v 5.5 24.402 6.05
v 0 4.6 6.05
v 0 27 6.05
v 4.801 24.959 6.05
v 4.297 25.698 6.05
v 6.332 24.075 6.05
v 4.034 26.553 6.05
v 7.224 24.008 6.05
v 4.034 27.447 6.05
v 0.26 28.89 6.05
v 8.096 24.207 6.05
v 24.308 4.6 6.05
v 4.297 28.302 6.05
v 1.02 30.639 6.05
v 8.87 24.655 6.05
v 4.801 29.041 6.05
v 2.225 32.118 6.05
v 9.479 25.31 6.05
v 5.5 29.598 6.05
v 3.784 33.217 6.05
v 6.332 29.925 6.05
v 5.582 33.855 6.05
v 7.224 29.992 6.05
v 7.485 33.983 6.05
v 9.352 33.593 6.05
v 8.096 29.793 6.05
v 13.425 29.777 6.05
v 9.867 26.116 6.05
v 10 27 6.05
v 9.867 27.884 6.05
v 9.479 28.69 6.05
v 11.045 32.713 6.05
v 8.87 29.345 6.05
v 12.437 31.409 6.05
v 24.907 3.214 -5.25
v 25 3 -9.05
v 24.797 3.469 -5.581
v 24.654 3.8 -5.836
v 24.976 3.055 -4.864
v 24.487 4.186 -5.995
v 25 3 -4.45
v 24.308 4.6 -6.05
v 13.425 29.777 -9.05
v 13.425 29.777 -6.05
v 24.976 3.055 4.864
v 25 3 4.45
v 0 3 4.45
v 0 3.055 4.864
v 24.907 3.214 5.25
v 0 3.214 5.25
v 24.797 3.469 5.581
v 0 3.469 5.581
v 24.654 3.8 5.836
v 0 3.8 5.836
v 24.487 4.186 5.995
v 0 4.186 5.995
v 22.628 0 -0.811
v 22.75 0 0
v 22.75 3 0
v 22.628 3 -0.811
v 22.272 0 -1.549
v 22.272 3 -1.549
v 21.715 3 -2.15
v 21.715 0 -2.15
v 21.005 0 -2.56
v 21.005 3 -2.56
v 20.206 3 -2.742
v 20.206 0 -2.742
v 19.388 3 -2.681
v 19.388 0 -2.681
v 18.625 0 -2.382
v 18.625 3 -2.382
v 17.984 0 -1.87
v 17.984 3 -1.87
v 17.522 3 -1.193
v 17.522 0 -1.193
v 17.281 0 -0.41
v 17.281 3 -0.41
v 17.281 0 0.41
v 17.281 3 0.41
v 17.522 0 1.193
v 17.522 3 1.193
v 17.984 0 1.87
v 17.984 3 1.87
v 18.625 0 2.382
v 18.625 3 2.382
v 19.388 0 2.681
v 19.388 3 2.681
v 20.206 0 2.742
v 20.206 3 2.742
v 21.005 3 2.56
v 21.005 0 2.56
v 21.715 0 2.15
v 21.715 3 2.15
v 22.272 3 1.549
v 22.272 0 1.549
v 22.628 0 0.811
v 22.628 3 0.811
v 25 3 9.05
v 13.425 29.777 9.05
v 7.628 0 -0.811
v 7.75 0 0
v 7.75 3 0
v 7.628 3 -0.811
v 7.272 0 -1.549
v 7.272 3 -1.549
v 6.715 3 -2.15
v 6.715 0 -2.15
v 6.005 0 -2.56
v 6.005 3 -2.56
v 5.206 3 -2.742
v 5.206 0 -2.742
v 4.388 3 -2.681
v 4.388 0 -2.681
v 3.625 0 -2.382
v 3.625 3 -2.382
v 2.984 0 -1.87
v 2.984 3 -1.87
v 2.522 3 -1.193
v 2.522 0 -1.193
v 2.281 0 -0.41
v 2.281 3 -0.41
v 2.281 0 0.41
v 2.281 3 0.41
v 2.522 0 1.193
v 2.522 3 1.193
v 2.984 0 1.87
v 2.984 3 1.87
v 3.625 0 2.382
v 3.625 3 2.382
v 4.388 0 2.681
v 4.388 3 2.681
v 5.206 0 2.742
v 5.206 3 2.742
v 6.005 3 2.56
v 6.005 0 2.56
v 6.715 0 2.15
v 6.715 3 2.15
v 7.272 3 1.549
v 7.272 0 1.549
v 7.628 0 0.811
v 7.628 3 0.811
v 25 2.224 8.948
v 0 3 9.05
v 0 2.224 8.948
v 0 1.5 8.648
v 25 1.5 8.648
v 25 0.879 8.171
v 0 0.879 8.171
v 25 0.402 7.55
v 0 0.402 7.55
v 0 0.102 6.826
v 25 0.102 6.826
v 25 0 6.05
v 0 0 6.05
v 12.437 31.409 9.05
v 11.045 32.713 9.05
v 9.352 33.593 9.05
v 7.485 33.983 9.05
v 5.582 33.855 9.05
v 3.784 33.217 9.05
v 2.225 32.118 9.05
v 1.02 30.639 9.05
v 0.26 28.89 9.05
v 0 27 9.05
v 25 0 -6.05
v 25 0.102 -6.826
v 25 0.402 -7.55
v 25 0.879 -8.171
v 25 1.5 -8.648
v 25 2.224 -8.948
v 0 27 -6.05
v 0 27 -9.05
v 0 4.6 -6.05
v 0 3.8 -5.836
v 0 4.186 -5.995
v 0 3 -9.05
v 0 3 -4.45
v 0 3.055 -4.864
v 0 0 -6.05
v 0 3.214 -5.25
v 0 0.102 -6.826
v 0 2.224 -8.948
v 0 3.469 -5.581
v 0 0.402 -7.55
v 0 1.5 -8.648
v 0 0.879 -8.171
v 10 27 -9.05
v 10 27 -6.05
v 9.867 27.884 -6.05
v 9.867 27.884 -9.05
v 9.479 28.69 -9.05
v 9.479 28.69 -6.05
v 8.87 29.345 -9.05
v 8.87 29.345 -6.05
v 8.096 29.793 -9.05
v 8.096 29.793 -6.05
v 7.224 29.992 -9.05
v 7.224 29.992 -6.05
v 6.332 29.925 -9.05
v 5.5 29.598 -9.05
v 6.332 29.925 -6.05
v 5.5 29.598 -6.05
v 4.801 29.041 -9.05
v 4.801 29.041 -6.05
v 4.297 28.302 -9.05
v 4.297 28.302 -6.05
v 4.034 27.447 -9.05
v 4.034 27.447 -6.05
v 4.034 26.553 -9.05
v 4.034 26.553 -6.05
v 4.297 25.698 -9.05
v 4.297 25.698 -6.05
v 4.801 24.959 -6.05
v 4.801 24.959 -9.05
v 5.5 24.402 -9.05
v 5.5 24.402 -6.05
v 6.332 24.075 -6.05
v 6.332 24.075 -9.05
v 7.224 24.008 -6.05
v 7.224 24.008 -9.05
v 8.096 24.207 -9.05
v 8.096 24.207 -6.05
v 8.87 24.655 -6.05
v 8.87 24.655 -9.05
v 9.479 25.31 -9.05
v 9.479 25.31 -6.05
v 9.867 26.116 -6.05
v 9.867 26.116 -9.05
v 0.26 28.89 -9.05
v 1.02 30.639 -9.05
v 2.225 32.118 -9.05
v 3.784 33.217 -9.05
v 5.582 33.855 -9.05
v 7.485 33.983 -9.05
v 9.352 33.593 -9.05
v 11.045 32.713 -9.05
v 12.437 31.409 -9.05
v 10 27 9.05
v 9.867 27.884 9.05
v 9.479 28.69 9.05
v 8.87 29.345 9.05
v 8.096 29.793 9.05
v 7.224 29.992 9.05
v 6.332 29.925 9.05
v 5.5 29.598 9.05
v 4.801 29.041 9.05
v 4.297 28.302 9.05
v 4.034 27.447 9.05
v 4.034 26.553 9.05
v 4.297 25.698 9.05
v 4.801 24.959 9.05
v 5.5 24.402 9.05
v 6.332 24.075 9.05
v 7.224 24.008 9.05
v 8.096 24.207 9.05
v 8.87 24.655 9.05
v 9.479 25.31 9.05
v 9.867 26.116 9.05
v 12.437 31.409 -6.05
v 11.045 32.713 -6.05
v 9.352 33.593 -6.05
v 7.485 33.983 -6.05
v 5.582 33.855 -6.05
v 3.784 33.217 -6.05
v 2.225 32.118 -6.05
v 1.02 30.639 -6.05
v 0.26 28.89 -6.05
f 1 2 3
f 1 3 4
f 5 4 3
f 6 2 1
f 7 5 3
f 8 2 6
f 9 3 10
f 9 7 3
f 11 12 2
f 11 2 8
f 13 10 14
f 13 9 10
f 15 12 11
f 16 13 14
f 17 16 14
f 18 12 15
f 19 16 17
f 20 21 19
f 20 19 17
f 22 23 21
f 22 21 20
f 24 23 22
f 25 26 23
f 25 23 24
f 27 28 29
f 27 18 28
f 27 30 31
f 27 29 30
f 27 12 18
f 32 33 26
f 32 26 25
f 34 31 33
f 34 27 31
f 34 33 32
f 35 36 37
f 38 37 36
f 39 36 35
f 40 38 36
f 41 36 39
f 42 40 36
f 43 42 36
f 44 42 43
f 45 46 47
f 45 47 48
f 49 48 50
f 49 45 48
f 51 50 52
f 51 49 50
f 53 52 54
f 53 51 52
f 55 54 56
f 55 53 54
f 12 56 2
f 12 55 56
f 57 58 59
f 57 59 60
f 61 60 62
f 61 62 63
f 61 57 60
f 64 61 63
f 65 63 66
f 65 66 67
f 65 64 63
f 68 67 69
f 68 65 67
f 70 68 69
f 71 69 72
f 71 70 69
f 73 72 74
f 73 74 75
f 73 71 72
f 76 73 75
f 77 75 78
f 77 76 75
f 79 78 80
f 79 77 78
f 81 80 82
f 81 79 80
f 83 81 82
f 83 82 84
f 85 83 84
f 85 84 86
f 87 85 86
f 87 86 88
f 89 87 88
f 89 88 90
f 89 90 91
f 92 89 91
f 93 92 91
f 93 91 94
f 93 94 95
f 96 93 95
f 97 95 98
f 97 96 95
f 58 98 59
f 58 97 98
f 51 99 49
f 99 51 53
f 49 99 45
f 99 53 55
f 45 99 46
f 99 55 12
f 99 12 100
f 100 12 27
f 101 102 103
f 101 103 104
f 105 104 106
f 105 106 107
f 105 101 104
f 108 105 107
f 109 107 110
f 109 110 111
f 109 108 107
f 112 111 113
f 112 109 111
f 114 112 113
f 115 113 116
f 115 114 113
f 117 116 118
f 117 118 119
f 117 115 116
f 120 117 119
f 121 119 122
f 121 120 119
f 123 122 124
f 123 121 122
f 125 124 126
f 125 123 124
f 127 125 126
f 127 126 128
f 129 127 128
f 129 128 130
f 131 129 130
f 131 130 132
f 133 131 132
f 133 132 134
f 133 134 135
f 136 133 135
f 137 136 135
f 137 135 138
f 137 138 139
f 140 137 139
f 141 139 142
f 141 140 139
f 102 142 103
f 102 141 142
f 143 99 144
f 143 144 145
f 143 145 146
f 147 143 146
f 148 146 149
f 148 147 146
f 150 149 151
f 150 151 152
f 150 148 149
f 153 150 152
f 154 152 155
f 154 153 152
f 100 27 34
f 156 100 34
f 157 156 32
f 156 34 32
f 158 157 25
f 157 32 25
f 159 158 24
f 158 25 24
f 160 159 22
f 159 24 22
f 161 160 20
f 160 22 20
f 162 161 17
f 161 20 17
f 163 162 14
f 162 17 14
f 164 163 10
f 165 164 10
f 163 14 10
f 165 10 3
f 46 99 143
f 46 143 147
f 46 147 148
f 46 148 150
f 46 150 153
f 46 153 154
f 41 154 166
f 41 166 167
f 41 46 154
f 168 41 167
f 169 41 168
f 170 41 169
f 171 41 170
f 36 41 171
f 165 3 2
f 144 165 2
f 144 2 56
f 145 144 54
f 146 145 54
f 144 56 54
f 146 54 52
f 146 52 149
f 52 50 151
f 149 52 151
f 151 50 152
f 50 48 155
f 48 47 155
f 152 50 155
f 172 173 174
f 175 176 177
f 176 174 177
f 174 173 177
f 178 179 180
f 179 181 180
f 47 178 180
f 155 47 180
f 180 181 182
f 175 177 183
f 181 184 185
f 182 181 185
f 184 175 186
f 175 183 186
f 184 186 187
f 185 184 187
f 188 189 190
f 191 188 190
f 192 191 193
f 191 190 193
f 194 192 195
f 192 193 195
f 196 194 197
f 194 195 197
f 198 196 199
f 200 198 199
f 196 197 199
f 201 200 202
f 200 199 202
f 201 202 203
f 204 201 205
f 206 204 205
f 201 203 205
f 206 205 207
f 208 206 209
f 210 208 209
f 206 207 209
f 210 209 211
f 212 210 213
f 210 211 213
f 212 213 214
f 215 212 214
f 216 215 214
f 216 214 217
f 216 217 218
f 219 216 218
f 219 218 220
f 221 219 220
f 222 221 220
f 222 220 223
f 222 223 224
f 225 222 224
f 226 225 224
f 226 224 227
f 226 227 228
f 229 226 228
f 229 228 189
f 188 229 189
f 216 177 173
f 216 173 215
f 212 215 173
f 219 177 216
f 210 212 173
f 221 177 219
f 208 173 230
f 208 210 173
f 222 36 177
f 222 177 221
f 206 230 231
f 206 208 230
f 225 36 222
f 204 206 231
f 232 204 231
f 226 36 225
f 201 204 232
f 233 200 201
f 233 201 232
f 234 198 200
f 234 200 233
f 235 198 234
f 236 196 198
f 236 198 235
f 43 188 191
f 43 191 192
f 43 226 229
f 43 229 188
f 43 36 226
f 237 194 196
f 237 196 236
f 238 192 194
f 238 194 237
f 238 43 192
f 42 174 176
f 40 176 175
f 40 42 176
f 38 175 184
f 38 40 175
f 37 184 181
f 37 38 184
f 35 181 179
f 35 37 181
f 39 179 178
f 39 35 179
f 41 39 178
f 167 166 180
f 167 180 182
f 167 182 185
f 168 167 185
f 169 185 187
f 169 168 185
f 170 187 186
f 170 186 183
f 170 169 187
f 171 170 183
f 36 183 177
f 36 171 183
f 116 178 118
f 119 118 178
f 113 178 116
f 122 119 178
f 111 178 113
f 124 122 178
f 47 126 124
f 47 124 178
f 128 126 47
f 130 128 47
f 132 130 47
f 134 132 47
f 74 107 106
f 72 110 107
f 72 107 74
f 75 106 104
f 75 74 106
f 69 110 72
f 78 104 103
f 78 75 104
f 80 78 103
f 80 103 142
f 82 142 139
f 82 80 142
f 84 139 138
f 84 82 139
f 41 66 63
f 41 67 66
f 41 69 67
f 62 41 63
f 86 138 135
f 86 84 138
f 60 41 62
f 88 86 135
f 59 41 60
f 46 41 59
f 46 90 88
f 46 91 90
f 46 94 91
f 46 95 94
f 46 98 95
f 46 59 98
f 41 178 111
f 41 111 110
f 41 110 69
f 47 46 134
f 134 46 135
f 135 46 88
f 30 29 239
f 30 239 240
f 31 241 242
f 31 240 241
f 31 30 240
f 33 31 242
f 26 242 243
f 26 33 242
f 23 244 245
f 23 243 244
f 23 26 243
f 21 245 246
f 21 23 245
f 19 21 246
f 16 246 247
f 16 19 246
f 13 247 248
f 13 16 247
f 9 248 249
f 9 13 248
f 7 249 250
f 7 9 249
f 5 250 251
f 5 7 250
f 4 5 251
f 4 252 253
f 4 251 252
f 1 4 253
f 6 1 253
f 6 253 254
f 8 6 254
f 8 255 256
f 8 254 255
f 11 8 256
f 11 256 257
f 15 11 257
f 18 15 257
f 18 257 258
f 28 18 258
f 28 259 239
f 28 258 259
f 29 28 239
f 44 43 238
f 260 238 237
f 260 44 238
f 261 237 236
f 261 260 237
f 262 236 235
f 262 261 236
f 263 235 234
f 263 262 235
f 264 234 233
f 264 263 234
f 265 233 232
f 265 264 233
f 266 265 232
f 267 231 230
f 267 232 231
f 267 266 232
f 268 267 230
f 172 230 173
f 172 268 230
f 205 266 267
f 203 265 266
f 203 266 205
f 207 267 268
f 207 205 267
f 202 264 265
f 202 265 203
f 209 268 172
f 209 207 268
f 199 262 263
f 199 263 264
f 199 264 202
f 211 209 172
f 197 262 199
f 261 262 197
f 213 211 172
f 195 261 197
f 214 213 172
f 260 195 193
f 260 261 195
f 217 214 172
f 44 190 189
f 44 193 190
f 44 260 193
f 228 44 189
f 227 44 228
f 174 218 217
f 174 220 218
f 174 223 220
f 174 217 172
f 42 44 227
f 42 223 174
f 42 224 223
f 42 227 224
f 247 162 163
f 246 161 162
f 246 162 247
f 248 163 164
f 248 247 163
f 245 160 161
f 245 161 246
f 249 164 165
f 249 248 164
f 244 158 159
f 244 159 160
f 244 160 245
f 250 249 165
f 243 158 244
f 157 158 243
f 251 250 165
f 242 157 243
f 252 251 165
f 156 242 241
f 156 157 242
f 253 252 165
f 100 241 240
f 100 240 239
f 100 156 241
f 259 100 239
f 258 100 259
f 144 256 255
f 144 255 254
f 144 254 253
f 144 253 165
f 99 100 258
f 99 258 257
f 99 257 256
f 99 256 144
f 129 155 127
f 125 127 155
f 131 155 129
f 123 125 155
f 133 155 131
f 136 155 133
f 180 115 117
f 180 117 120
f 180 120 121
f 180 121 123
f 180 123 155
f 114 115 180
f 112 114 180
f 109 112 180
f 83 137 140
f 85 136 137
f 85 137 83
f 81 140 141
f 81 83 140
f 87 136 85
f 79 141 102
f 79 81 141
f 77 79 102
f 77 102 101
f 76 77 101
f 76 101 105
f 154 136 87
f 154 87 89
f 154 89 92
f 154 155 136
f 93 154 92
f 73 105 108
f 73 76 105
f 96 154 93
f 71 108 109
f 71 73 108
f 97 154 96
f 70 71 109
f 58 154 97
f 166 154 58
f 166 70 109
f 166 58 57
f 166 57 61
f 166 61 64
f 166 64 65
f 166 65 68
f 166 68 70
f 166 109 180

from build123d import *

# Parameters (mm, degrees)
BOSS_EXTRUDE1_DEPTH      = 25
BOSS_EXTRUDE1_DEPTH_BACK = 25
CUT_EXTRUDE1_DEPTH       = 25
CUT_EXTRUDE1_DEPTH_BACK  = 25
SKETCH2_W                = 74.2
SKETCH2_H                = 66.1
CUT_EXTRUDE2_DEPTH       = 12.1
CUT_EXTRUDE2_DEPTH_BACK  = 12.1
SKETCH3_R                = 3
CUT_EXTRUDE3_DEPTH       = 3
CUT_EXTRUDE3_DEPTH_BACK  = 3
SKETCH4_R                = 2.75
CUT_EXTRUDE4_DEPTH       = 3
CUT_EXTRUDE4_DEPTH_BACK  = 3
SKETCH5_R                = 2.75


with BuildPart() as part:
    # Sketch1 → Boss-Extrude1 (new, two sides: drawn at the far end of the back side and taken through both)
    with BuildSketch(Plane(origin=(0, 0, 0), x_dir=(0, 0, -1), z_dir=(1, 0, 0)).offset(-BOSS_EXTRUDE1_DEPTH_BACK)):
        with BuildLine():
            Line((-6.05, 0), (6.05, 0))
            ThreePointArc((6.05, 0), (8.171320344, 0.878679656), (9.05, 3))
            Line((9.05, 3), (9.05, 34))
            Line((9.05, 34), (6.05, 34))
            Line((6.05, 34), (6.05, 4.6))
            ThreePointArc((6.05, 4.6), (5.58137085, 3.46862915), (4.45, 3))
            Line((4.45, 3), (-4.45, 3))
            ThreePointArc((-4.45, 3), (-5.58137085, 3.46862915), (-6.05, 4.6))
            Line((-6.05, 4.6), (-6.05, 34))
            Line((-6.05, 34), (-9.05, 34))
            Line((-9.05, 34), (-9.05, 3))
            ThreePointArc((-9.05, 3), (-8.171320344, 0.878679656), (-6.05, 0))
        make_face()
    extrude(amount=BOSS_EXTRUDE1_DEPTH + BOSS_EXTRUDE1_DEPTH_BACK)

    # Sketch2 → Cut-Extrude1 (cut, two sides: drawn at the far end of the back side and taken through both)
    with BuildSketch(Plane.XY.offset(-CUT_EXTRUDE1_DEPTH_BACK)):
        with Locations((0, 20.95)):
            Rectangle(SKETCH2_W, SKETCH2_H)
        with BuildLine():
            Line((0, 0), (25, 0))
            Line((25, 0), (25, 3))
            Line((25, 3), (13.425422134, 29.777399934))
            ThreePointArc((13.425422134, 29.777399934), (5.58189474, 33.854850653), (0, 27))
            Line((0, 27), (0, 0))
        make_face(mode=Mode.SUBTRACT)
    extrude(amount=CUT_EXTRUDE1_DEPTH + CUT_EXTRUDE1_DEPTH_BACK, mode=Mode.SUBTRACT)

    # Sketch3 → Cut-Extrude2 (cut, two sides: drawn at the far end of the back side and taken through both)
    with BuildSketch(Plane.XY.offset(-CUT_EXTRUDE2_DEPTH_BACK)):
        with Locations((7, 27)):
            Circle(SKETCH3_R)
    extrude(amount=CUT_EXTRUDE2_DEPTH + CUT_EXTRUDE2_DEPTH_BACK, mode=Mode.SUBTRACT)

    # Sketch4 → Cut-Extrude3 (cut, two sides: drawn at the far end of the back side and taken through both)
    with BuildSketch(Plane(origin=(0, 0, 0), x_dir=(1, 0, 0), z_dir=(0, 1, 0)).offset(-CUT_EXTRUDE3_DEPTH_BACK)):
        with Locations((5, 0)):
            Circle(SKETCH4_R)
    extrude(amount=CUT_EXTRUDE3_DEPTH + CUT_EXTRUDE3_DEPTH_BACK, mode=Mode.SUBTRACT)

    # Sketch5 → Cut-Extrude4 (cut, two sides: drawn at the far end of the back side and taken through both)
    with BuildSketch(Plane(origin=(0, 0, 0), x_dir=(1, 0, 0), z_dir=(0, 1, 0)).offset(-CUT_EXTRUDE4_DEPTH_BACK)):
        with Locations((20, 0)):
            Circle(SKETCH5_R)
    extrude(amount=CUT_EXTRUDE4_DEPTH + CUT_EXTRUDE4_DEPTH_BACK, mode=Mode.SUBTRACT)


solid = part.part
